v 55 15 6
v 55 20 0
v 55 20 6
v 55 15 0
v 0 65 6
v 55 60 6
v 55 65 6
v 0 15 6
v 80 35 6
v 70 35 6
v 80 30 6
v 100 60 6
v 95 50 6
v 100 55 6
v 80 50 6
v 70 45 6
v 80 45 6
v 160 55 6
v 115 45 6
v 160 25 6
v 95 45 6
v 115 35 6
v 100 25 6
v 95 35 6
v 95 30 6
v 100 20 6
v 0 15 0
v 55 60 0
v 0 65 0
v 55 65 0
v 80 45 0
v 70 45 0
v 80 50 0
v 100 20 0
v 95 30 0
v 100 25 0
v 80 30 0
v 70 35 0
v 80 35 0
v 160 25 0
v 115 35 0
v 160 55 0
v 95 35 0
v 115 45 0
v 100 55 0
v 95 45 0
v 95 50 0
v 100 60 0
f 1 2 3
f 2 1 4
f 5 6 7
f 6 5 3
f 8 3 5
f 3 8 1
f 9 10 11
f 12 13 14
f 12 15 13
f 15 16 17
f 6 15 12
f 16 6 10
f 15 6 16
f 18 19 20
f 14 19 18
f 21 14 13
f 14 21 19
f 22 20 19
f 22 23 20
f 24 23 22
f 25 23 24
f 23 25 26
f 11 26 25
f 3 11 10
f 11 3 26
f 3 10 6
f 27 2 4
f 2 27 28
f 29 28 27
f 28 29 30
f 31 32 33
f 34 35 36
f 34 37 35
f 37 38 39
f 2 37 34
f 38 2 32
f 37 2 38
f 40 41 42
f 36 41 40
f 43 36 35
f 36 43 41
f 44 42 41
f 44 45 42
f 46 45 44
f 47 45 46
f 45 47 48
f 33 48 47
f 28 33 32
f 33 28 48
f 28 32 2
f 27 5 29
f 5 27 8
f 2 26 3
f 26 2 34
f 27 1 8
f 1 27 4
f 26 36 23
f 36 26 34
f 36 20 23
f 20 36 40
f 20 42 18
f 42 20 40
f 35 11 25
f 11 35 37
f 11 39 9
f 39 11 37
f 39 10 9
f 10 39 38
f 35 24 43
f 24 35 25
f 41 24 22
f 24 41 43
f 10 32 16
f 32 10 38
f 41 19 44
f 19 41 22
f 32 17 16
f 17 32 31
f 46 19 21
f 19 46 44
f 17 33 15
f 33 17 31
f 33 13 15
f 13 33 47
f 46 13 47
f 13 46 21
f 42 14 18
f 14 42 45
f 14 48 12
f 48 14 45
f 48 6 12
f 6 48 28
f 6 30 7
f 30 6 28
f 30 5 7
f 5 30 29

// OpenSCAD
// Generated by SHIVA-1 cad_generator - parametric OpenSCAD model
// Units: millimetres.
// domain: generative_bracket
pixel = 5;
thickness = 6;
// CPPN-NEAT generated bracket (run-length merged pixels)
union() {
  translate([0.000, 15.000, 0]) cube([55.000, 5.000, thickness]);
  translate([0.000, 20.000, 0]) cube([100.000, 5.000, thickness]);
  translate([0.000, 25.000, 0]) cube([160.000, 5.000, thickness]);
  translate([0.000, 30.000, 0]) cube([80.000, 5.000, thickness]);
  translate([95.000, 30.000, 0]) cube([65.000, 5.000, thickness]);
  translate([0.000, 35.000, 0]) cube([70.000, 5.000, thickness]);
  translate([115.000, 35.000, 0]) cube([45.000, 5.000, thickness]);
  translate([0.000, 40.000, 0]) cube([70.000, 5.000, thickness]);
  translate([115.000, 40.000, 0]) cube([45.000, 5.000, thickness]);
  translate([0.000, 45.000, 0]) cube([80.000, 5.000, thickness]);
  translate([95.000, 45.000, 0]) cube([65.000, 5.000, thickness]);
  translate([0.000, 50.000, 0]) cube([160.000, 5.000, thickness]);
  translate([0.000, 55.000, 0]) cube([100.000, 5.000, thickness]);
  translate([0.000, 60.000, 0]) cube([55.000, 5.000, thickness]);
}
